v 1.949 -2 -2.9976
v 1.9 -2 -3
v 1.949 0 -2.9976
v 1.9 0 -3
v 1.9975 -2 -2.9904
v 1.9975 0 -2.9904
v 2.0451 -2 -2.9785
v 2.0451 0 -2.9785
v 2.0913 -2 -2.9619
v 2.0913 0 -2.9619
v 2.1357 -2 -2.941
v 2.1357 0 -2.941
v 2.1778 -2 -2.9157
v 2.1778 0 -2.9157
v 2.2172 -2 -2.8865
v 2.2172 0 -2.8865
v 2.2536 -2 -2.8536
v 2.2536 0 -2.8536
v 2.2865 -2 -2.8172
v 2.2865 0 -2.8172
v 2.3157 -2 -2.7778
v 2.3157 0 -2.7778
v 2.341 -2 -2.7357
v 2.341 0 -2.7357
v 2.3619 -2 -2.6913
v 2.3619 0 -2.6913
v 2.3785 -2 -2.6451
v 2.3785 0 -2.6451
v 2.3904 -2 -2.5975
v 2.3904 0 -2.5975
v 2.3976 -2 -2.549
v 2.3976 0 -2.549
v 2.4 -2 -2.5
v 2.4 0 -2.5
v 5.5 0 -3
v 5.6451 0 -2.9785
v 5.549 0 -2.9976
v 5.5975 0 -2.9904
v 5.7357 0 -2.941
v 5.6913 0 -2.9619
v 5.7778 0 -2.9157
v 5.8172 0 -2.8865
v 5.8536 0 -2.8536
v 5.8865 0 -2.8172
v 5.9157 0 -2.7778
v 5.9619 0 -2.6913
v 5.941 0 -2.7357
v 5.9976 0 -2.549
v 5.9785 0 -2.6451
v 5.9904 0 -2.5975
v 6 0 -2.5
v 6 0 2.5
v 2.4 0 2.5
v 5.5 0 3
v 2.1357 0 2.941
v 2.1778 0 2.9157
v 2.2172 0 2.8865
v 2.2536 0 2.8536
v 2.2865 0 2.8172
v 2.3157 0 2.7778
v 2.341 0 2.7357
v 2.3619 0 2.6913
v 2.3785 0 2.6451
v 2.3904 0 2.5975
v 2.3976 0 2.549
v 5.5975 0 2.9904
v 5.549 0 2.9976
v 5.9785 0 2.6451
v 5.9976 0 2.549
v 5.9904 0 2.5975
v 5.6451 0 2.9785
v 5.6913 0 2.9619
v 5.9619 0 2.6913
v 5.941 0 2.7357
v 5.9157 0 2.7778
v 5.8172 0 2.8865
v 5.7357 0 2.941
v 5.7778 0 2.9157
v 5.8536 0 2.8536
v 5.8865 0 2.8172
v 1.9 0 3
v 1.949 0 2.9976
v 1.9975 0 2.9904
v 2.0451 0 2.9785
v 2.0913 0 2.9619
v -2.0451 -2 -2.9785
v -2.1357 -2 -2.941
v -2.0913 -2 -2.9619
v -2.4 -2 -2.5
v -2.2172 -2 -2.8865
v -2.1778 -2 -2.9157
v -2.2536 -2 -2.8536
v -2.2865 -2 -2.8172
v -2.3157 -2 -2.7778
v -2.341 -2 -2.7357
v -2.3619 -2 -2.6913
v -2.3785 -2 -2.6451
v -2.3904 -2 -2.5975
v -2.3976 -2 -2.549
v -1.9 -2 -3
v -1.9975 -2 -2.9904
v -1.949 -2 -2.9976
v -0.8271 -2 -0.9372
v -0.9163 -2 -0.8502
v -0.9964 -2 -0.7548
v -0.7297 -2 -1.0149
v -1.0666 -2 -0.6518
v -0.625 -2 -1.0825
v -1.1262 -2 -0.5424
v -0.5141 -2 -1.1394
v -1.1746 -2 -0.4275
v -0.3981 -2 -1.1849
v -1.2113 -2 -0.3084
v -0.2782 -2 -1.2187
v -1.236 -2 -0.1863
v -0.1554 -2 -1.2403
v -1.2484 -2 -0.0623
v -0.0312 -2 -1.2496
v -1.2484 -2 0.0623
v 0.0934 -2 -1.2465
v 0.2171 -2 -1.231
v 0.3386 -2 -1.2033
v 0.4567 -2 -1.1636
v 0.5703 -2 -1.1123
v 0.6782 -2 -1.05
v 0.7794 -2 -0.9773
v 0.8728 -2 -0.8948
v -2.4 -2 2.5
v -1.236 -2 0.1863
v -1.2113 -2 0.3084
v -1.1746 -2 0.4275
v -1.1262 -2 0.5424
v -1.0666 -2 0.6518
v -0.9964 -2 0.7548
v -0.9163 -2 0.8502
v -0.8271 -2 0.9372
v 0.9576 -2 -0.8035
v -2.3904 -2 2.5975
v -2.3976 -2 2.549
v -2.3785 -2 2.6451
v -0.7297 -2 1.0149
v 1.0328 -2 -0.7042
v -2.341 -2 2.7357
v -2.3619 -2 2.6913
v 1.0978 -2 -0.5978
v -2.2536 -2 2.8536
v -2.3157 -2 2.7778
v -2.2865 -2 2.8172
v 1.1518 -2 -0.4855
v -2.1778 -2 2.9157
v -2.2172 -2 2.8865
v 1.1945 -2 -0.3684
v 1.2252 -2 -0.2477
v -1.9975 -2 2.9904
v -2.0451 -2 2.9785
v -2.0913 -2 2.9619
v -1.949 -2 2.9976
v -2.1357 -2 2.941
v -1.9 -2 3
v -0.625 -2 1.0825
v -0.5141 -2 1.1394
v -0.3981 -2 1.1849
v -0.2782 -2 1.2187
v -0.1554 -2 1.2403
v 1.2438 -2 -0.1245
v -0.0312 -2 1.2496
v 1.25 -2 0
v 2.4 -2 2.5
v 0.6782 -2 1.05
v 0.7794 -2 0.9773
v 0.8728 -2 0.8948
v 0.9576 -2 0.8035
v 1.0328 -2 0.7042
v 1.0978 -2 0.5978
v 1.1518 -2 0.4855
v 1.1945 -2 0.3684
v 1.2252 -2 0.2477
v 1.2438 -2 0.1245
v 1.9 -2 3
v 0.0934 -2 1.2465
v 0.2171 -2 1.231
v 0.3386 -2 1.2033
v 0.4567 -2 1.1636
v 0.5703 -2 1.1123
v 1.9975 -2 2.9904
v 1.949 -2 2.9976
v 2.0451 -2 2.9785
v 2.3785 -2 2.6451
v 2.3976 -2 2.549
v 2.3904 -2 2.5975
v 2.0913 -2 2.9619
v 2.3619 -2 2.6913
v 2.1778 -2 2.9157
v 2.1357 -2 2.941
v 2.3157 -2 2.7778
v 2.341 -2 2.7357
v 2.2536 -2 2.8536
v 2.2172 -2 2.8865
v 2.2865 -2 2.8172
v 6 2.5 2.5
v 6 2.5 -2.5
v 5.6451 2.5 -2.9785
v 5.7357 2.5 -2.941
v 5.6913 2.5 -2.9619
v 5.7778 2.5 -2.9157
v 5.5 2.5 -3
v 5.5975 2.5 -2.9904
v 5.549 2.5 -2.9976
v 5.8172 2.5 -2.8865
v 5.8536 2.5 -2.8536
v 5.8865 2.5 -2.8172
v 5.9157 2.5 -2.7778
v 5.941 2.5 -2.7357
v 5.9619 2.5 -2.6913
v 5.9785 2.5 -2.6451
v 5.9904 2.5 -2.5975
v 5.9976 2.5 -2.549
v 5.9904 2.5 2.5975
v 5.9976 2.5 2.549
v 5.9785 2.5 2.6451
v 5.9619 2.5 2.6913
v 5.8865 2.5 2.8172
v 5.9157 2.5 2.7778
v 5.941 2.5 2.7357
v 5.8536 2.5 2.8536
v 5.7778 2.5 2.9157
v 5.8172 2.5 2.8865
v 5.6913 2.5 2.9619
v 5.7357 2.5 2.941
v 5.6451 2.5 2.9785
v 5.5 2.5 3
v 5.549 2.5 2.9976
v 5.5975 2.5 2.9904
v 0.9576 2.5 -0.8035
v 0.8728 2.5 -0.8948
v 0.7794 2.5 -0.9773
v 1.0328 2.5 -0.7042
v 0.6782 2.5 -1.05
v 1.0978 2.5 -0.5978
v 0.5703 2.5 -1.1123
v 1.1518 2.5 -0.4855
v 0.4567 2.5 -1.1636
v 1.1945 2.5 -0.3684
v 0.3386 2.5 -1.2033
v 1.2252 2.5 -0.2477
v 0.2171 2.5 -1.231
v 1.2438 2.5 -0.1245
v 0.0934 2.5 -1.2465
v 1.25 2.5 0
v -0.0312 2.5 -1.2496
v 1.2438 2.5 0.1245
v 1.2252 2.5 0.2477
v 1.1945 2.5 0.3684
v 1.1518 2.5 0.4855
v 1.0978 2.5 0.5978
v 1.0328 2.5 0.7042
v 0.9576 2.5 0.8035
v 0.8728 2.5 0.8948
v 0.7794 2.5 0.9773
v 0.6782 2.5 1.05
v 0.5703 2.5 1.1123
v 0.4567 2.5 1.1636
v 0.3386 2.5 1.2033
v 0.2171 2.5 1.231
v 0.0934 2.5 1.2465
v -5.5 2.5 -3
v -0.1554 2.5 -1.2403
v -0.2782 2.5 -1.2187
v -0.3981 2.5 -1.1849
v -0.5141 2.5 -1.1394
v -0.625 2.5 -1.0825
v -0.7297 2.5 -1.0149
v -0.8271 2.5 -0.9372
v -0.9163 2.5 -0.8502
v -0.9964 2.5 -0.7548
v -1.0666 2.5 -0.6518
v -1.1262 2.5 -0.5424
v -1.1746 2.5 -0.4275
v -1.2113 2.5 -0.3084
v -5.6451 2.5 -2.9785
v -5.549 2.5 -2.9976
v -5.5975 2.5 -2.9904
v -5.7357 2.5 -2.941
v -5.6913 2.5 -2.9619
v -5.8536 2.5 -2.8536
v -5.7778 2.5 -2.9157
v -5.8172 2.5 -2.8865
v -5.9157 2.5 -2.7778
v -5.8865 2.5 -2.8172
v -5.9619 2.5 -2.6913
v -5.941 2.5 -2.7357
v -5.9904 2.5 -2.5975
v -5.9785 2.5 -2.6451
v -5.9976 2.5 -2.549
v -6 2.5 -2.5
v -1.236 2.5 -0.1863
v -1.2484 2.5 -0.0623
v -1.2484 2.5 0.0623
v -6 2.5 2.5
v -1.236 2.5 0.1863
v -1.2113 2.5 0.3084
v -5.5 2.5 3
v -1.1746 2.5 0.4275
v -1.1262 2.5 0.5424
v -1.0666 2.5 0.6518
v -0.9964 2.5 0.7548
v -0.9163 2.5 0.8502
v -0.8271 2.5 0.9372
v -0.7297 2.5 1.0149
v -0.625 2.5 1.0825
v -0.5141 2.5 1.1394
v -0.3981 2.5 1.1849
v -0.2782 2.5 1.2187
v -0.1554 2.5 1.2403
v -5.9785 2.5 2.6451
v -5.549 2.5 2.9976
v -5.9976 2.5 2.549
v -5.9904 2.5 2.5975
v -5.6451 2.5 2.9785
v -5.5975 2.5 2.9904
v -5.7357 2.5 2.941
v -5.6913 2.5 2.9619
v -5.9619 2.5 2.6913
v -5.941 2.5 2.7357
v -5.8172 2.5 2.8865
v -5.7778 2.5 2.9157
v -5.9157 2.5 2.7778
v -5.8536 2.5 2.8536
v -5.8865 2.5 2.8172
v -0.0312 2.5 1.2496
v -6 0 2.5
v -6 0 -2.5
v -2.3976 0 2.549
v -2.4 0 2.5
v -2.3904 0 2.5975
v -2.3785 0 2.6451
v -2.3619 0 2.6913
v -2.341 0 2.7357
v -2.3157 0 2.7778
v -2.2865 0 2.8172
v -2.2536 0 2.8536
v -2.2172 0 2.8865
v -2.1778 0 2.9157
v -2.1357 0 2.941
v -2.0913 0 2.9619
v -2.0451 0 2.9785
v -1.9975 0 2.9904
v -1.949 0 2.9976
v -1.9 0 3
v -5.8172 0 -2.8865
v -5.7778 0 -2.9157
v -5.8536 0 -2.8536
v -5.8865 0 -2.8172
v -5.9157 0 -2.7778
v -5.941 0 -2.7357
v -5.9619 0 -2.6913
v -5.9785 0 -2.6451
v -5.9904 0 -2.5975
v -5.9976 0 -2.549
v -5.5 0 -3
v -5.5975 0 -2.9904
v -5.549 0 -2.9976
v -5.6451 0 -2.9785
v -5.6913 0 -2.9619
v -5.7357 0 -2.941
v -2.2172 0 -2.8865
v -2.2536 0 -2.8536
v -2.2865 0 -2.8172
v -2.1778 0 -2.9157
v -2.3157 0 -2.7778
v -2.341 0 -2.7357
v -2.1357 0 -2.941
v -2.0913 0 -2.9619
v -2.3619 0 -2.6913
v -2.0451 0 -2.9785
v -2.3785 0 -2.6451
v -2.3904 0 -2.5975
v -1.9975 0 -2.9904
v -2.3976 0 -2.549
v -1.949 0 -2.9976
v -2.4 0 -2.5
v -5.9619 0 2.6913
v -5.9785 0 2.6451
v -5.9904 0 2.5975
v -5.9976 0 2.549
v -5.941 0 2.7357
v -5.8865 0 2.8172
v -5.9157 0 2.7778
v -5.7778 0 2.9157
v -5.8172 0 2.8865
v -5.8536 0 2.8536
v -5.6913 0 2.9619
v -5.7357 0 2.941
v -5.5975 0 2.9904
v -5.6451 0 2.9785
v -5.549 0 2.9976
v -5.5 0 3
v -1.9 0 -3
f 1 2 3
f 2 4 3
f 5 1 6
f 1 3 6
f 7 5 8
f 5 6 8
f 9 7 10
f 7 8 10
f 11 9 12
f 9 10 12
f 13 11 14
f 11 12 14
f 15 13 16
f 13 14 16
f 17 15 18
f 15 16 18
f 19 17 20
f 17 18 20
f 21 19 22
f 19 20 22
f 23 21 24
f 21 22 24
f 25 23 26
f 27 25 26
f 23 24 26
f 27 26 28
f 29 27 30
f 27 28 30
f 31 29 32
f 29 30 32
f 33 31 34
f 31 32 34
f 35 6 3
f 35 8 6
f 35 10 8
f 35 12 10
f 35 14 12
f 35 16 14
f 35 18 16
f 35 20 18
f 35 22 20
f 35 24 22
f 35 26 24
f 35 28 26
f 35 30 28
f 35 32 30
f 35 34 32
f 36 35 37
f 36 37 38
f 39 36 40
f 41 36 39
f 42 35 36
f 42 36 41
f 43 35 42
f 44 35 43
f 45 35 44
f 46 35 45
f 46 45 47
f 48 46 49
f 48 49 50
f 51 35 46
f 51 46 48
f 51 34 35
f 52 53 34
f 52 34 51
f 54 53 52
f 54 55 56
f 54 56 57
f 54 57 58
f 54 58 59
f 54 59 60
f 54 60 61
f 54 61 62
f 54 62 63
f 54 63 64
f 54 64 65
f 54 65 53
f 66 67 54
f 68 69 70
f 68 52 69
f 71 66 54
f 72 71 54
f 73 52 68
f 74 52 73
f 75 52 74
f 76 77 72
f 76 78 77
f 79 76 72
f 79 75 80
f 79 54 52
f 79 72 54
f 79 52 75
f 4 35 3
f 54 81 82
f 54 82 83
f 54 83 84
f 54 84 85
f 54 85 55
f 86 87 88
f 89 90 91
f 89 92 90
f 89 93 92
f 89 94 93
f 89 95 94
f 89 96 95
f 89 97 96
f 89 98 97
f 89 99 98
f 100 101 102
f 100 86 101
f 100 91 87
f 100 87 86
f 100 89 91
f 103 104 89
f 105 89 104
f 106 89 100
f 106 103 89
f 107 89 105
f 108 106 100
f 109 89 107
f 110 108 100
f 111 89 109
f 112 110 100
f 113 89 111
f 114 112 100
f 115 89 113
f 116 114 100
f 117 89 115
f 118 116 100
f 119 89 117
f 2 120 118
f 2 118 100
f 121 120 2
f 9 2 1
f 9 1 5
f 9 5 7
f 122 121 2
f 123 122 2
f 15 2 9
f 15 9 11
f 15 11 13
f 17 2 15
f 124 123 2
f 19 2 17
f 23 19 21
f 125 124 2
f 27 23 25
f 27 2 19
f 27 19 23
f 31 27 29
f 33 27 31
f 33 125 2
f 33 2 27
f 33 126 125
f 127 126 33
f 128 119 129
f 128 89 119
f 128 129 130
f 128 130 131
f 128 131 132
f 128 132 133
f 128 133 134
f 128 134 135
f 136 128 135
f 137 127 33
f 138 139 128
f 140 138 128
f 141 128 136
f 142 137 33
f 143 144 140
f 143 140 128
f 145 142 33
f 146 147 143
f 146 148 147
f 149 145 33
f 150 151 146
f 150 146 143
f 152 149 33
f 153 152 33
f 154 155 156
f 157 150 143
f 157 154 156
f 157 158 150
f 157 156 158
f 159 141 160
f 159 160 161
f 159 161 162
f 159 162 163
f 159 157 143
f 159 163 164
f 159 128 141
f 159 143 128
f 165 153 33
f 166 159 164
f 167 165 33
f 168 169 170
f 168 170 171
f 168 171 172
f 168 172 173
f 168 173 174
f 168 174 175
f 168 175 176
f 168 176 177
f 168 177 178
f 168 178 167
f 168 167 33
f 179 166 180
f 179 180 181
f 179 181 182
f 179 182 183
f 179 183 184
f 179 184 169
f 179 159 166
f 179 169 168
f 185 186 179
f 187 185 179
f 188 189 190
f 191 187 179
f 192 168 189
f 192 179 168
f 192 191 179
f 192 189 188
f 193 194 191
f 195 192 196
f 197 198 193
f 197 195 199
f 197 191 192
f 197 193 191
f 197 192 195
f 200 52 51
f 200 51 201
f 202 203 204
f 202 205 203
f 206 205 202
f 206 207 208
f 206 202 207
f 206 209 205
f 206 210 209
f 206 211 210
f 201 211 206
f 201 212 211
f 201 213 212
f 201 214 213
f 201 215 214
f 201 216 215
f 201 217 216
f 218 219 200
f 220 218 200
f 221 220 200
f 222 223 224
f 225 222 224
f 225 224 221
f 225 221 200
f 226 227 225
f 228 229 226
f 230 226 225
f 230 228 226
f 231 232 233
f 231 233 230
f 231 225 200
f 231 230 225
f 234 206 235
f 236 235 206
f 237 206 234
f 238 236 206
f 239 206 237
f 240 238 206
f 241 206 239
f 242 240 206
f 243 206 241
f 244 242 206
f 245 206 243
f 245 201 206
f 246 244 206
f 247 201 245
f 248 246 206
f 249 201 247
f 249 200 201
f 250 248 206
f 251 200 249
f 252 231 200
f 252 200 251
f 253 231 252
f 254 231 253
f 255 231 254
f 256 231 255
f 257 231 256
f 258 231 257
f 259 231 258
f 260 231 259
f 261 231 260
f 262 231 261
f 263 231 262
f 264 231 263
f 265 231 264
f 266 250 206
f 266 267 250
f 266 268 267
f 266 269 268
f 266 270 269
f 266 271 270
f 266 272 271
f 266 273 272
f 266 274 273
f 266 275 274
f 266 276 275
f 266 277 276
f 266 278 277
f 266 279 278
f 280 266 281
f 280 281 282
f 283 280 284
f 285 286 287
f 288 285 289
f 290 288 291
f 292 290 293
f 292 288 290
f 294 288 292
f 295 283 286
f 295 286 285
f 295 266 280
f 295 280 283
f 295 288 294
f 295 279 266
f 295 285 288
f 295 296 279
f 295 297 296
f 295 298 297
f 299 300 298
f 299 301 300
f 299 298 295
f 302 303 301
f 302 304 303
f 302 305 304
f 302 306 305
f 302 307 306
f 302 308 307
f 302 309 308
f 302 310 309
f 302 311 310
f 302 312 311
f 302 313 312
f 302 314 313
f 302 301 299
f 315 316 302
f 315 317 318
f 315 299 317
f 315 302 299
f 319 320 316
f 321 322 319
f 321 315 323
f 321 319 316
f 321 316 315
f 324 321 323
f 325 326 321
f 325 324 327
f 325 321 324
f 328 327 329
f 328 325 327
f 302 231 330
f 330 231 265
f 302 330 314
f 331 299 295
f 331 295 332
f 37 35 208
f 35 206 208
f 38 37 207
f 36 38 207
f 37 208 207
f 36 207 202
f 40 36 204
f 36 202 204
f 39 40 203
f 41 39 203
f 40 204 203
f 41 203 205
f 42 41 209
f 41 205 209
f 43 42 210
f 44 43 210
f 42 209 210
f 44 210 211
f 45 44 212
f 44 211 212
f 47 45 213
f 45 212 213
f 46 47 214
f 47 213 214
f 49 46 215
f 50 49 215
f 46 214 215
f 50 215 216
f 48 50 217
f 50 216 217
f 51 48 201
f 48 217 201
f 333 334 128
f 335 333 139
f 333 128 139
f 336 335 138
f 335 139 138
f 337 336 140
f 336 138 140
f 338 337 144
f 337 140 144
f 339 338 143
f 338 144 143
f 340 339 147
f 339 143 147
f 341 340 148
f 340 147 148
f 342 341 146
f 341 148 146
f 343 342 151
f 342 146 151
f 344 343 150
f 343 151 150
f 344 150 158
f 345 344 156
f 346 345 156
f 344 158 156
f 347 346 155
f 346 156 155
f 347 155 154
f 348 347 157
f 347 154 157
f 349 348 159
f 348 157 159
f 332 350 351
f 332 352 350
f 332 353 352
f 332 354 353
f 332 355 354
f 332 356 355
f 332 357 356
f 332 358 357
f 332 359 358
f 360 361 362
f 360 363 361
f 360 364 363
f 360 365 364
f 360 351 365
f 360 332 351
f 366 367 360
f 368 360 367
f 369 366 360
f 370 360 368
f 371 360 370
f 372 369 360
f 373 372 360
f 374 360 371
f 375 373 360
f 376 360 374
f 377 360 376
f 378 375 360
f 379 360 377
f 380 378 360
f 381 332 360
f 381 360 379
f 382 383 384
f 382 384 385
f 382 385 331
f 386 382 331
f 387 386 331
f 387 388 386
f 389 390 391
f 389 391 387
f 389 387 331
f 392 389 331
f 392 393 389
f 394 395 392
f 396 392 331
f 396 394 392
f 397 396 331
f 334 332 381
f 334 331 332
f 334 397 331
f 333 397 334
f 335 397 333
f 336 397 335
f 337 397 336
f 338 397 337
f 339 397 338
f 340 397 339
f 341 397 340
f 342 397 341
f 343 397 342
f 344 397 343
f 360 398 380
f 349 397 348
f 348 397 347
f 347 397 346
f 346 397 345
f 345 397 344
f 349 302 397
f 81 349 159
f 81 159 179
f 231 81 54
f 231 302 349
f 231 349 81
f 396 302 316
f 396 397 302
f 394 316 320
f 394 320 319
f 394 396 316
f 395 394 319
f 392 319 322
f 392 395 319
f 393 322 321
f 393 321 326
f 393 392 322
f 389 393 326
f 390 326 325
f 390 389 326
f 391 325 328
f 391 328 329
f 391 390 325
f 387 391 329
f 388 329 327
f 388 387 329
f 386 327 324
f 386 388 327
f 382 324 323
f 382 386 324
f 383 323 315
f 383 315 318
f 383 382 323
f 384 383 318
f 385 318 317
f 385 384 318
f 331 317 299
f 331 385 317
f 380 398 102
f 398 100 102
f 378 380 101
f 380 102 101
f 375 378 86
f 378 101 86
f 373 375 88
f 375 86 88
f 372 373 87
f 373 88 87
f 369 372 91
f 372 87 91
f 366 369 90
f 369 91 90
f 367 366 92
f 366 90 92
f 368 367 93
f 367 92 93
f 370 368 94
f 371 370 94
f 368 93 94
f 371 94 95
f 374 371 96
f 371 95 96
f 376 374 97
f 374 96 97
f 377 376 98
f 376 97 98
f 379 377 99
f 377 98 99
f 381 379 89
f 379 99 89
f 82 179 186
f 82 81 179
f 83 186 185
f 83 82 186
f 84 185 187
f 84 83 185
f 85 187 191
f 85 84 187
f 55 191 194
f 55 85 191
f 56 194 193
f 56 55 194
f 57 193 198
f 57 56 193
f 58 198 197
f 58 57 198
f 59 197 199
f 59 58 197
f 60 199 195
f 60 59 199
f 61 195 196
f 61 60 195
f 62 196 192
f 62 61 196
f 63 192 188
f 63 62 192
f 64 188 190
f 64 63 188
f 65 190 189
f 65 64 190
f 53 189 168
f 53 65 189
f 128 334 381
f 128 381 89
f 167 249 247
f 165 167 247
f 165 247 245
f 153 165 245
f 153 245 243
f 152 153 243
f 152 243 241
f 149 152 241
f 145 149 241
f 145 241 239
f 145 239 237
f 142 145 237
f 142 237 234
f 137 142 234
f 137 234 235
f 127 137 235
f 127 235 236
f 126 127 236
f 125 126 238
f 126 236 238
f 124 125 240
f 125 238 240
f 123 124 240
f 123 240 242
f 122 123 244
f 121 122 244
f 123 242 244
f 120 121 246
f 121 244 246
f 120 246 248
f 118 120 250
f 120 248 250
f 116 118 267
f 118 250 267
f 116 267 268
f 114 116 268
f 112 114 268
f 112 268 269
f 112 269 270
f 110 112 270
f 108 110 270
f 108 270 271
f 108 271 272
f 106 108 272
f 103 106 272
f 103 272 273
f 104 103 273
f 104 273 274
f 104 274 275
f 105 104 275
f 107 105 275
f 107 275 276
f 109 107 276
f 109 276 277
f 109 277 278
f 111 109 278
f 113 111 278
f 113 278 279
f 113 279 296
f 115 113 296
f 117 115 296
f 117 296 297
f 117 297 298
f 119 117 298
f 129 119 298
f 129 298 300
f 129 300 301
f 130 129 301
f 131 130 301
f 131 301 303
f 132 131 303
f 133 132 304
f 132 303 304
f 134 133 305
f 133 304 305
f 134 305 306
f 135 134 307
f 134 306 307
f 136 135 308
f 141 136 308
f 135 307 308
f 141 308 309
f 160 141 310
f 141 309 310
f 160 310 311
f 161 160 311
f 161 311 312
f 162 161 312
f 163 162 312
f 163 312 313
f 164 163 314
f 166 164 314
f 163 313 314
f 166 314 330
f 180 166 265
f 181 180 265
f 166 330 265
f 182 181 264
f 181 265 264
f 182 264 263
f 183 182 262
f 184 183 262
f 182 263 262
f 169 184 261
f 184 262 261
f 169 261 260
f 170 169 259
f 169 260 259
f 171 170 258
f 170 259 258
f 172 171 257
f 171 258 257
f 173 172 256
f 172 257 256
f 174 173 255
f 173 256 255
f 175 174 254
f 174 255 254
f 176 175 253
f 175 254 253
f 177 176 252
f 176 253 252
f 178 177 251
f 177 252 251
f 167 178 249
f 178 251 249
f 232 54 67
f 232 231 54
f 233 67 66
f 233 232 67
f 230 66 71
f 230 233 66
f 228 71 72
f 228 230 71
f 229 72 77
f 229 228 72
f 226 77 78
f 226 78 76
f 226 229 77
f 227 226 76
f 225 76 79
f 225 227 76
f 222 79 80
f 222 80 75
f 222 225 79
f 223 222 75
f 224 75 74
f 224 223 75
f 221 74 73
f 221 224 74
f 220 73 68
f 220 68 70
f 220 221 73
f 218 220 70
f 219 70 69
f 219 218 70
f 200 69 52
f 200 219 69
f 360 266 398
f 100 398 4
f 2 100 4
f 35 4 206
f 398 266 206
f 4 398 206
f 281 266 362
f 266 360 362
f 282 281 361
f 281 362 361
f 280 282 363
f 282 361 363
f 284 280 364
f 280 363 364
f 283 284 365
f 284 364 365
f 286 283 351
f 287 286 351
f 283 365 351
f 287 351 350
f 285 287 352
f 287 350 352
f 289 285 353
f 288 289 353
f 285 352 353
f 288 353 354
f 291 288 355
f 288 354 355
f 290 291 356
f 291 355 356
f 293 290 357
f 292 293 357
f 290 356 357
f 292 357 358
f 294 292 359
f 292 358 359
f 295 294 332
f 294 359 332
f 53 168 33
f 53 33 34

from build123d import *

# Parameters (mm, degrees)
BOSS_EXTRU_1_DEPTH      = 3
ESQUISSE2_R             = 1.25
ENL_V_MAT_EXTRU_1_DEPTH = 5.5
CONG_1_R                = 0.5


with BuildPart() as part:
    # Esquisse1 → Boss.-Extru.1 (new body, symmetric)
    with BuildSketch(Plane.XY):
        Polygon((-6, 0), (-2.4, 0), (-2.4, -2), (2.4, -2), (2.4, 0), (6, 0), (6, 2.5), (-6, 2.5), align=None)
    extrude(amount=BOSS_EXTRU_1_DEPTH, both=True)

    # Esquisse2 → Enlèv. mat.-Extru.1 (cut, through all)
    with BuildSketch(Plane(origin=(0, 2.5, 0), x_dir=(1, 0, 0), z_dir=(0, 1, 0))):
        Circle(ESQUISSE2_R)
    extrude(amount=-ENL_V_MAT_EXTRU_1_DEPTH, mode=Mode.SUBTRACT)

    # Congé1
    cong_1_edges = [part.edges().sort_by_distance(p)[0] for p in [
        (-6, 1.25, -3),
        (6, 1.25, -3),
        (-6, 1.25, 3),
        (-2.4, -1, 3),
        (2.4, -1, 3),
        (6, 1.25, 3),
        (2.4, -1, -3),
        (-2.4, -1, -3),
    ]]
    fillet(cong_1_edges, radius=CONG_1_R)


solid = part.part
